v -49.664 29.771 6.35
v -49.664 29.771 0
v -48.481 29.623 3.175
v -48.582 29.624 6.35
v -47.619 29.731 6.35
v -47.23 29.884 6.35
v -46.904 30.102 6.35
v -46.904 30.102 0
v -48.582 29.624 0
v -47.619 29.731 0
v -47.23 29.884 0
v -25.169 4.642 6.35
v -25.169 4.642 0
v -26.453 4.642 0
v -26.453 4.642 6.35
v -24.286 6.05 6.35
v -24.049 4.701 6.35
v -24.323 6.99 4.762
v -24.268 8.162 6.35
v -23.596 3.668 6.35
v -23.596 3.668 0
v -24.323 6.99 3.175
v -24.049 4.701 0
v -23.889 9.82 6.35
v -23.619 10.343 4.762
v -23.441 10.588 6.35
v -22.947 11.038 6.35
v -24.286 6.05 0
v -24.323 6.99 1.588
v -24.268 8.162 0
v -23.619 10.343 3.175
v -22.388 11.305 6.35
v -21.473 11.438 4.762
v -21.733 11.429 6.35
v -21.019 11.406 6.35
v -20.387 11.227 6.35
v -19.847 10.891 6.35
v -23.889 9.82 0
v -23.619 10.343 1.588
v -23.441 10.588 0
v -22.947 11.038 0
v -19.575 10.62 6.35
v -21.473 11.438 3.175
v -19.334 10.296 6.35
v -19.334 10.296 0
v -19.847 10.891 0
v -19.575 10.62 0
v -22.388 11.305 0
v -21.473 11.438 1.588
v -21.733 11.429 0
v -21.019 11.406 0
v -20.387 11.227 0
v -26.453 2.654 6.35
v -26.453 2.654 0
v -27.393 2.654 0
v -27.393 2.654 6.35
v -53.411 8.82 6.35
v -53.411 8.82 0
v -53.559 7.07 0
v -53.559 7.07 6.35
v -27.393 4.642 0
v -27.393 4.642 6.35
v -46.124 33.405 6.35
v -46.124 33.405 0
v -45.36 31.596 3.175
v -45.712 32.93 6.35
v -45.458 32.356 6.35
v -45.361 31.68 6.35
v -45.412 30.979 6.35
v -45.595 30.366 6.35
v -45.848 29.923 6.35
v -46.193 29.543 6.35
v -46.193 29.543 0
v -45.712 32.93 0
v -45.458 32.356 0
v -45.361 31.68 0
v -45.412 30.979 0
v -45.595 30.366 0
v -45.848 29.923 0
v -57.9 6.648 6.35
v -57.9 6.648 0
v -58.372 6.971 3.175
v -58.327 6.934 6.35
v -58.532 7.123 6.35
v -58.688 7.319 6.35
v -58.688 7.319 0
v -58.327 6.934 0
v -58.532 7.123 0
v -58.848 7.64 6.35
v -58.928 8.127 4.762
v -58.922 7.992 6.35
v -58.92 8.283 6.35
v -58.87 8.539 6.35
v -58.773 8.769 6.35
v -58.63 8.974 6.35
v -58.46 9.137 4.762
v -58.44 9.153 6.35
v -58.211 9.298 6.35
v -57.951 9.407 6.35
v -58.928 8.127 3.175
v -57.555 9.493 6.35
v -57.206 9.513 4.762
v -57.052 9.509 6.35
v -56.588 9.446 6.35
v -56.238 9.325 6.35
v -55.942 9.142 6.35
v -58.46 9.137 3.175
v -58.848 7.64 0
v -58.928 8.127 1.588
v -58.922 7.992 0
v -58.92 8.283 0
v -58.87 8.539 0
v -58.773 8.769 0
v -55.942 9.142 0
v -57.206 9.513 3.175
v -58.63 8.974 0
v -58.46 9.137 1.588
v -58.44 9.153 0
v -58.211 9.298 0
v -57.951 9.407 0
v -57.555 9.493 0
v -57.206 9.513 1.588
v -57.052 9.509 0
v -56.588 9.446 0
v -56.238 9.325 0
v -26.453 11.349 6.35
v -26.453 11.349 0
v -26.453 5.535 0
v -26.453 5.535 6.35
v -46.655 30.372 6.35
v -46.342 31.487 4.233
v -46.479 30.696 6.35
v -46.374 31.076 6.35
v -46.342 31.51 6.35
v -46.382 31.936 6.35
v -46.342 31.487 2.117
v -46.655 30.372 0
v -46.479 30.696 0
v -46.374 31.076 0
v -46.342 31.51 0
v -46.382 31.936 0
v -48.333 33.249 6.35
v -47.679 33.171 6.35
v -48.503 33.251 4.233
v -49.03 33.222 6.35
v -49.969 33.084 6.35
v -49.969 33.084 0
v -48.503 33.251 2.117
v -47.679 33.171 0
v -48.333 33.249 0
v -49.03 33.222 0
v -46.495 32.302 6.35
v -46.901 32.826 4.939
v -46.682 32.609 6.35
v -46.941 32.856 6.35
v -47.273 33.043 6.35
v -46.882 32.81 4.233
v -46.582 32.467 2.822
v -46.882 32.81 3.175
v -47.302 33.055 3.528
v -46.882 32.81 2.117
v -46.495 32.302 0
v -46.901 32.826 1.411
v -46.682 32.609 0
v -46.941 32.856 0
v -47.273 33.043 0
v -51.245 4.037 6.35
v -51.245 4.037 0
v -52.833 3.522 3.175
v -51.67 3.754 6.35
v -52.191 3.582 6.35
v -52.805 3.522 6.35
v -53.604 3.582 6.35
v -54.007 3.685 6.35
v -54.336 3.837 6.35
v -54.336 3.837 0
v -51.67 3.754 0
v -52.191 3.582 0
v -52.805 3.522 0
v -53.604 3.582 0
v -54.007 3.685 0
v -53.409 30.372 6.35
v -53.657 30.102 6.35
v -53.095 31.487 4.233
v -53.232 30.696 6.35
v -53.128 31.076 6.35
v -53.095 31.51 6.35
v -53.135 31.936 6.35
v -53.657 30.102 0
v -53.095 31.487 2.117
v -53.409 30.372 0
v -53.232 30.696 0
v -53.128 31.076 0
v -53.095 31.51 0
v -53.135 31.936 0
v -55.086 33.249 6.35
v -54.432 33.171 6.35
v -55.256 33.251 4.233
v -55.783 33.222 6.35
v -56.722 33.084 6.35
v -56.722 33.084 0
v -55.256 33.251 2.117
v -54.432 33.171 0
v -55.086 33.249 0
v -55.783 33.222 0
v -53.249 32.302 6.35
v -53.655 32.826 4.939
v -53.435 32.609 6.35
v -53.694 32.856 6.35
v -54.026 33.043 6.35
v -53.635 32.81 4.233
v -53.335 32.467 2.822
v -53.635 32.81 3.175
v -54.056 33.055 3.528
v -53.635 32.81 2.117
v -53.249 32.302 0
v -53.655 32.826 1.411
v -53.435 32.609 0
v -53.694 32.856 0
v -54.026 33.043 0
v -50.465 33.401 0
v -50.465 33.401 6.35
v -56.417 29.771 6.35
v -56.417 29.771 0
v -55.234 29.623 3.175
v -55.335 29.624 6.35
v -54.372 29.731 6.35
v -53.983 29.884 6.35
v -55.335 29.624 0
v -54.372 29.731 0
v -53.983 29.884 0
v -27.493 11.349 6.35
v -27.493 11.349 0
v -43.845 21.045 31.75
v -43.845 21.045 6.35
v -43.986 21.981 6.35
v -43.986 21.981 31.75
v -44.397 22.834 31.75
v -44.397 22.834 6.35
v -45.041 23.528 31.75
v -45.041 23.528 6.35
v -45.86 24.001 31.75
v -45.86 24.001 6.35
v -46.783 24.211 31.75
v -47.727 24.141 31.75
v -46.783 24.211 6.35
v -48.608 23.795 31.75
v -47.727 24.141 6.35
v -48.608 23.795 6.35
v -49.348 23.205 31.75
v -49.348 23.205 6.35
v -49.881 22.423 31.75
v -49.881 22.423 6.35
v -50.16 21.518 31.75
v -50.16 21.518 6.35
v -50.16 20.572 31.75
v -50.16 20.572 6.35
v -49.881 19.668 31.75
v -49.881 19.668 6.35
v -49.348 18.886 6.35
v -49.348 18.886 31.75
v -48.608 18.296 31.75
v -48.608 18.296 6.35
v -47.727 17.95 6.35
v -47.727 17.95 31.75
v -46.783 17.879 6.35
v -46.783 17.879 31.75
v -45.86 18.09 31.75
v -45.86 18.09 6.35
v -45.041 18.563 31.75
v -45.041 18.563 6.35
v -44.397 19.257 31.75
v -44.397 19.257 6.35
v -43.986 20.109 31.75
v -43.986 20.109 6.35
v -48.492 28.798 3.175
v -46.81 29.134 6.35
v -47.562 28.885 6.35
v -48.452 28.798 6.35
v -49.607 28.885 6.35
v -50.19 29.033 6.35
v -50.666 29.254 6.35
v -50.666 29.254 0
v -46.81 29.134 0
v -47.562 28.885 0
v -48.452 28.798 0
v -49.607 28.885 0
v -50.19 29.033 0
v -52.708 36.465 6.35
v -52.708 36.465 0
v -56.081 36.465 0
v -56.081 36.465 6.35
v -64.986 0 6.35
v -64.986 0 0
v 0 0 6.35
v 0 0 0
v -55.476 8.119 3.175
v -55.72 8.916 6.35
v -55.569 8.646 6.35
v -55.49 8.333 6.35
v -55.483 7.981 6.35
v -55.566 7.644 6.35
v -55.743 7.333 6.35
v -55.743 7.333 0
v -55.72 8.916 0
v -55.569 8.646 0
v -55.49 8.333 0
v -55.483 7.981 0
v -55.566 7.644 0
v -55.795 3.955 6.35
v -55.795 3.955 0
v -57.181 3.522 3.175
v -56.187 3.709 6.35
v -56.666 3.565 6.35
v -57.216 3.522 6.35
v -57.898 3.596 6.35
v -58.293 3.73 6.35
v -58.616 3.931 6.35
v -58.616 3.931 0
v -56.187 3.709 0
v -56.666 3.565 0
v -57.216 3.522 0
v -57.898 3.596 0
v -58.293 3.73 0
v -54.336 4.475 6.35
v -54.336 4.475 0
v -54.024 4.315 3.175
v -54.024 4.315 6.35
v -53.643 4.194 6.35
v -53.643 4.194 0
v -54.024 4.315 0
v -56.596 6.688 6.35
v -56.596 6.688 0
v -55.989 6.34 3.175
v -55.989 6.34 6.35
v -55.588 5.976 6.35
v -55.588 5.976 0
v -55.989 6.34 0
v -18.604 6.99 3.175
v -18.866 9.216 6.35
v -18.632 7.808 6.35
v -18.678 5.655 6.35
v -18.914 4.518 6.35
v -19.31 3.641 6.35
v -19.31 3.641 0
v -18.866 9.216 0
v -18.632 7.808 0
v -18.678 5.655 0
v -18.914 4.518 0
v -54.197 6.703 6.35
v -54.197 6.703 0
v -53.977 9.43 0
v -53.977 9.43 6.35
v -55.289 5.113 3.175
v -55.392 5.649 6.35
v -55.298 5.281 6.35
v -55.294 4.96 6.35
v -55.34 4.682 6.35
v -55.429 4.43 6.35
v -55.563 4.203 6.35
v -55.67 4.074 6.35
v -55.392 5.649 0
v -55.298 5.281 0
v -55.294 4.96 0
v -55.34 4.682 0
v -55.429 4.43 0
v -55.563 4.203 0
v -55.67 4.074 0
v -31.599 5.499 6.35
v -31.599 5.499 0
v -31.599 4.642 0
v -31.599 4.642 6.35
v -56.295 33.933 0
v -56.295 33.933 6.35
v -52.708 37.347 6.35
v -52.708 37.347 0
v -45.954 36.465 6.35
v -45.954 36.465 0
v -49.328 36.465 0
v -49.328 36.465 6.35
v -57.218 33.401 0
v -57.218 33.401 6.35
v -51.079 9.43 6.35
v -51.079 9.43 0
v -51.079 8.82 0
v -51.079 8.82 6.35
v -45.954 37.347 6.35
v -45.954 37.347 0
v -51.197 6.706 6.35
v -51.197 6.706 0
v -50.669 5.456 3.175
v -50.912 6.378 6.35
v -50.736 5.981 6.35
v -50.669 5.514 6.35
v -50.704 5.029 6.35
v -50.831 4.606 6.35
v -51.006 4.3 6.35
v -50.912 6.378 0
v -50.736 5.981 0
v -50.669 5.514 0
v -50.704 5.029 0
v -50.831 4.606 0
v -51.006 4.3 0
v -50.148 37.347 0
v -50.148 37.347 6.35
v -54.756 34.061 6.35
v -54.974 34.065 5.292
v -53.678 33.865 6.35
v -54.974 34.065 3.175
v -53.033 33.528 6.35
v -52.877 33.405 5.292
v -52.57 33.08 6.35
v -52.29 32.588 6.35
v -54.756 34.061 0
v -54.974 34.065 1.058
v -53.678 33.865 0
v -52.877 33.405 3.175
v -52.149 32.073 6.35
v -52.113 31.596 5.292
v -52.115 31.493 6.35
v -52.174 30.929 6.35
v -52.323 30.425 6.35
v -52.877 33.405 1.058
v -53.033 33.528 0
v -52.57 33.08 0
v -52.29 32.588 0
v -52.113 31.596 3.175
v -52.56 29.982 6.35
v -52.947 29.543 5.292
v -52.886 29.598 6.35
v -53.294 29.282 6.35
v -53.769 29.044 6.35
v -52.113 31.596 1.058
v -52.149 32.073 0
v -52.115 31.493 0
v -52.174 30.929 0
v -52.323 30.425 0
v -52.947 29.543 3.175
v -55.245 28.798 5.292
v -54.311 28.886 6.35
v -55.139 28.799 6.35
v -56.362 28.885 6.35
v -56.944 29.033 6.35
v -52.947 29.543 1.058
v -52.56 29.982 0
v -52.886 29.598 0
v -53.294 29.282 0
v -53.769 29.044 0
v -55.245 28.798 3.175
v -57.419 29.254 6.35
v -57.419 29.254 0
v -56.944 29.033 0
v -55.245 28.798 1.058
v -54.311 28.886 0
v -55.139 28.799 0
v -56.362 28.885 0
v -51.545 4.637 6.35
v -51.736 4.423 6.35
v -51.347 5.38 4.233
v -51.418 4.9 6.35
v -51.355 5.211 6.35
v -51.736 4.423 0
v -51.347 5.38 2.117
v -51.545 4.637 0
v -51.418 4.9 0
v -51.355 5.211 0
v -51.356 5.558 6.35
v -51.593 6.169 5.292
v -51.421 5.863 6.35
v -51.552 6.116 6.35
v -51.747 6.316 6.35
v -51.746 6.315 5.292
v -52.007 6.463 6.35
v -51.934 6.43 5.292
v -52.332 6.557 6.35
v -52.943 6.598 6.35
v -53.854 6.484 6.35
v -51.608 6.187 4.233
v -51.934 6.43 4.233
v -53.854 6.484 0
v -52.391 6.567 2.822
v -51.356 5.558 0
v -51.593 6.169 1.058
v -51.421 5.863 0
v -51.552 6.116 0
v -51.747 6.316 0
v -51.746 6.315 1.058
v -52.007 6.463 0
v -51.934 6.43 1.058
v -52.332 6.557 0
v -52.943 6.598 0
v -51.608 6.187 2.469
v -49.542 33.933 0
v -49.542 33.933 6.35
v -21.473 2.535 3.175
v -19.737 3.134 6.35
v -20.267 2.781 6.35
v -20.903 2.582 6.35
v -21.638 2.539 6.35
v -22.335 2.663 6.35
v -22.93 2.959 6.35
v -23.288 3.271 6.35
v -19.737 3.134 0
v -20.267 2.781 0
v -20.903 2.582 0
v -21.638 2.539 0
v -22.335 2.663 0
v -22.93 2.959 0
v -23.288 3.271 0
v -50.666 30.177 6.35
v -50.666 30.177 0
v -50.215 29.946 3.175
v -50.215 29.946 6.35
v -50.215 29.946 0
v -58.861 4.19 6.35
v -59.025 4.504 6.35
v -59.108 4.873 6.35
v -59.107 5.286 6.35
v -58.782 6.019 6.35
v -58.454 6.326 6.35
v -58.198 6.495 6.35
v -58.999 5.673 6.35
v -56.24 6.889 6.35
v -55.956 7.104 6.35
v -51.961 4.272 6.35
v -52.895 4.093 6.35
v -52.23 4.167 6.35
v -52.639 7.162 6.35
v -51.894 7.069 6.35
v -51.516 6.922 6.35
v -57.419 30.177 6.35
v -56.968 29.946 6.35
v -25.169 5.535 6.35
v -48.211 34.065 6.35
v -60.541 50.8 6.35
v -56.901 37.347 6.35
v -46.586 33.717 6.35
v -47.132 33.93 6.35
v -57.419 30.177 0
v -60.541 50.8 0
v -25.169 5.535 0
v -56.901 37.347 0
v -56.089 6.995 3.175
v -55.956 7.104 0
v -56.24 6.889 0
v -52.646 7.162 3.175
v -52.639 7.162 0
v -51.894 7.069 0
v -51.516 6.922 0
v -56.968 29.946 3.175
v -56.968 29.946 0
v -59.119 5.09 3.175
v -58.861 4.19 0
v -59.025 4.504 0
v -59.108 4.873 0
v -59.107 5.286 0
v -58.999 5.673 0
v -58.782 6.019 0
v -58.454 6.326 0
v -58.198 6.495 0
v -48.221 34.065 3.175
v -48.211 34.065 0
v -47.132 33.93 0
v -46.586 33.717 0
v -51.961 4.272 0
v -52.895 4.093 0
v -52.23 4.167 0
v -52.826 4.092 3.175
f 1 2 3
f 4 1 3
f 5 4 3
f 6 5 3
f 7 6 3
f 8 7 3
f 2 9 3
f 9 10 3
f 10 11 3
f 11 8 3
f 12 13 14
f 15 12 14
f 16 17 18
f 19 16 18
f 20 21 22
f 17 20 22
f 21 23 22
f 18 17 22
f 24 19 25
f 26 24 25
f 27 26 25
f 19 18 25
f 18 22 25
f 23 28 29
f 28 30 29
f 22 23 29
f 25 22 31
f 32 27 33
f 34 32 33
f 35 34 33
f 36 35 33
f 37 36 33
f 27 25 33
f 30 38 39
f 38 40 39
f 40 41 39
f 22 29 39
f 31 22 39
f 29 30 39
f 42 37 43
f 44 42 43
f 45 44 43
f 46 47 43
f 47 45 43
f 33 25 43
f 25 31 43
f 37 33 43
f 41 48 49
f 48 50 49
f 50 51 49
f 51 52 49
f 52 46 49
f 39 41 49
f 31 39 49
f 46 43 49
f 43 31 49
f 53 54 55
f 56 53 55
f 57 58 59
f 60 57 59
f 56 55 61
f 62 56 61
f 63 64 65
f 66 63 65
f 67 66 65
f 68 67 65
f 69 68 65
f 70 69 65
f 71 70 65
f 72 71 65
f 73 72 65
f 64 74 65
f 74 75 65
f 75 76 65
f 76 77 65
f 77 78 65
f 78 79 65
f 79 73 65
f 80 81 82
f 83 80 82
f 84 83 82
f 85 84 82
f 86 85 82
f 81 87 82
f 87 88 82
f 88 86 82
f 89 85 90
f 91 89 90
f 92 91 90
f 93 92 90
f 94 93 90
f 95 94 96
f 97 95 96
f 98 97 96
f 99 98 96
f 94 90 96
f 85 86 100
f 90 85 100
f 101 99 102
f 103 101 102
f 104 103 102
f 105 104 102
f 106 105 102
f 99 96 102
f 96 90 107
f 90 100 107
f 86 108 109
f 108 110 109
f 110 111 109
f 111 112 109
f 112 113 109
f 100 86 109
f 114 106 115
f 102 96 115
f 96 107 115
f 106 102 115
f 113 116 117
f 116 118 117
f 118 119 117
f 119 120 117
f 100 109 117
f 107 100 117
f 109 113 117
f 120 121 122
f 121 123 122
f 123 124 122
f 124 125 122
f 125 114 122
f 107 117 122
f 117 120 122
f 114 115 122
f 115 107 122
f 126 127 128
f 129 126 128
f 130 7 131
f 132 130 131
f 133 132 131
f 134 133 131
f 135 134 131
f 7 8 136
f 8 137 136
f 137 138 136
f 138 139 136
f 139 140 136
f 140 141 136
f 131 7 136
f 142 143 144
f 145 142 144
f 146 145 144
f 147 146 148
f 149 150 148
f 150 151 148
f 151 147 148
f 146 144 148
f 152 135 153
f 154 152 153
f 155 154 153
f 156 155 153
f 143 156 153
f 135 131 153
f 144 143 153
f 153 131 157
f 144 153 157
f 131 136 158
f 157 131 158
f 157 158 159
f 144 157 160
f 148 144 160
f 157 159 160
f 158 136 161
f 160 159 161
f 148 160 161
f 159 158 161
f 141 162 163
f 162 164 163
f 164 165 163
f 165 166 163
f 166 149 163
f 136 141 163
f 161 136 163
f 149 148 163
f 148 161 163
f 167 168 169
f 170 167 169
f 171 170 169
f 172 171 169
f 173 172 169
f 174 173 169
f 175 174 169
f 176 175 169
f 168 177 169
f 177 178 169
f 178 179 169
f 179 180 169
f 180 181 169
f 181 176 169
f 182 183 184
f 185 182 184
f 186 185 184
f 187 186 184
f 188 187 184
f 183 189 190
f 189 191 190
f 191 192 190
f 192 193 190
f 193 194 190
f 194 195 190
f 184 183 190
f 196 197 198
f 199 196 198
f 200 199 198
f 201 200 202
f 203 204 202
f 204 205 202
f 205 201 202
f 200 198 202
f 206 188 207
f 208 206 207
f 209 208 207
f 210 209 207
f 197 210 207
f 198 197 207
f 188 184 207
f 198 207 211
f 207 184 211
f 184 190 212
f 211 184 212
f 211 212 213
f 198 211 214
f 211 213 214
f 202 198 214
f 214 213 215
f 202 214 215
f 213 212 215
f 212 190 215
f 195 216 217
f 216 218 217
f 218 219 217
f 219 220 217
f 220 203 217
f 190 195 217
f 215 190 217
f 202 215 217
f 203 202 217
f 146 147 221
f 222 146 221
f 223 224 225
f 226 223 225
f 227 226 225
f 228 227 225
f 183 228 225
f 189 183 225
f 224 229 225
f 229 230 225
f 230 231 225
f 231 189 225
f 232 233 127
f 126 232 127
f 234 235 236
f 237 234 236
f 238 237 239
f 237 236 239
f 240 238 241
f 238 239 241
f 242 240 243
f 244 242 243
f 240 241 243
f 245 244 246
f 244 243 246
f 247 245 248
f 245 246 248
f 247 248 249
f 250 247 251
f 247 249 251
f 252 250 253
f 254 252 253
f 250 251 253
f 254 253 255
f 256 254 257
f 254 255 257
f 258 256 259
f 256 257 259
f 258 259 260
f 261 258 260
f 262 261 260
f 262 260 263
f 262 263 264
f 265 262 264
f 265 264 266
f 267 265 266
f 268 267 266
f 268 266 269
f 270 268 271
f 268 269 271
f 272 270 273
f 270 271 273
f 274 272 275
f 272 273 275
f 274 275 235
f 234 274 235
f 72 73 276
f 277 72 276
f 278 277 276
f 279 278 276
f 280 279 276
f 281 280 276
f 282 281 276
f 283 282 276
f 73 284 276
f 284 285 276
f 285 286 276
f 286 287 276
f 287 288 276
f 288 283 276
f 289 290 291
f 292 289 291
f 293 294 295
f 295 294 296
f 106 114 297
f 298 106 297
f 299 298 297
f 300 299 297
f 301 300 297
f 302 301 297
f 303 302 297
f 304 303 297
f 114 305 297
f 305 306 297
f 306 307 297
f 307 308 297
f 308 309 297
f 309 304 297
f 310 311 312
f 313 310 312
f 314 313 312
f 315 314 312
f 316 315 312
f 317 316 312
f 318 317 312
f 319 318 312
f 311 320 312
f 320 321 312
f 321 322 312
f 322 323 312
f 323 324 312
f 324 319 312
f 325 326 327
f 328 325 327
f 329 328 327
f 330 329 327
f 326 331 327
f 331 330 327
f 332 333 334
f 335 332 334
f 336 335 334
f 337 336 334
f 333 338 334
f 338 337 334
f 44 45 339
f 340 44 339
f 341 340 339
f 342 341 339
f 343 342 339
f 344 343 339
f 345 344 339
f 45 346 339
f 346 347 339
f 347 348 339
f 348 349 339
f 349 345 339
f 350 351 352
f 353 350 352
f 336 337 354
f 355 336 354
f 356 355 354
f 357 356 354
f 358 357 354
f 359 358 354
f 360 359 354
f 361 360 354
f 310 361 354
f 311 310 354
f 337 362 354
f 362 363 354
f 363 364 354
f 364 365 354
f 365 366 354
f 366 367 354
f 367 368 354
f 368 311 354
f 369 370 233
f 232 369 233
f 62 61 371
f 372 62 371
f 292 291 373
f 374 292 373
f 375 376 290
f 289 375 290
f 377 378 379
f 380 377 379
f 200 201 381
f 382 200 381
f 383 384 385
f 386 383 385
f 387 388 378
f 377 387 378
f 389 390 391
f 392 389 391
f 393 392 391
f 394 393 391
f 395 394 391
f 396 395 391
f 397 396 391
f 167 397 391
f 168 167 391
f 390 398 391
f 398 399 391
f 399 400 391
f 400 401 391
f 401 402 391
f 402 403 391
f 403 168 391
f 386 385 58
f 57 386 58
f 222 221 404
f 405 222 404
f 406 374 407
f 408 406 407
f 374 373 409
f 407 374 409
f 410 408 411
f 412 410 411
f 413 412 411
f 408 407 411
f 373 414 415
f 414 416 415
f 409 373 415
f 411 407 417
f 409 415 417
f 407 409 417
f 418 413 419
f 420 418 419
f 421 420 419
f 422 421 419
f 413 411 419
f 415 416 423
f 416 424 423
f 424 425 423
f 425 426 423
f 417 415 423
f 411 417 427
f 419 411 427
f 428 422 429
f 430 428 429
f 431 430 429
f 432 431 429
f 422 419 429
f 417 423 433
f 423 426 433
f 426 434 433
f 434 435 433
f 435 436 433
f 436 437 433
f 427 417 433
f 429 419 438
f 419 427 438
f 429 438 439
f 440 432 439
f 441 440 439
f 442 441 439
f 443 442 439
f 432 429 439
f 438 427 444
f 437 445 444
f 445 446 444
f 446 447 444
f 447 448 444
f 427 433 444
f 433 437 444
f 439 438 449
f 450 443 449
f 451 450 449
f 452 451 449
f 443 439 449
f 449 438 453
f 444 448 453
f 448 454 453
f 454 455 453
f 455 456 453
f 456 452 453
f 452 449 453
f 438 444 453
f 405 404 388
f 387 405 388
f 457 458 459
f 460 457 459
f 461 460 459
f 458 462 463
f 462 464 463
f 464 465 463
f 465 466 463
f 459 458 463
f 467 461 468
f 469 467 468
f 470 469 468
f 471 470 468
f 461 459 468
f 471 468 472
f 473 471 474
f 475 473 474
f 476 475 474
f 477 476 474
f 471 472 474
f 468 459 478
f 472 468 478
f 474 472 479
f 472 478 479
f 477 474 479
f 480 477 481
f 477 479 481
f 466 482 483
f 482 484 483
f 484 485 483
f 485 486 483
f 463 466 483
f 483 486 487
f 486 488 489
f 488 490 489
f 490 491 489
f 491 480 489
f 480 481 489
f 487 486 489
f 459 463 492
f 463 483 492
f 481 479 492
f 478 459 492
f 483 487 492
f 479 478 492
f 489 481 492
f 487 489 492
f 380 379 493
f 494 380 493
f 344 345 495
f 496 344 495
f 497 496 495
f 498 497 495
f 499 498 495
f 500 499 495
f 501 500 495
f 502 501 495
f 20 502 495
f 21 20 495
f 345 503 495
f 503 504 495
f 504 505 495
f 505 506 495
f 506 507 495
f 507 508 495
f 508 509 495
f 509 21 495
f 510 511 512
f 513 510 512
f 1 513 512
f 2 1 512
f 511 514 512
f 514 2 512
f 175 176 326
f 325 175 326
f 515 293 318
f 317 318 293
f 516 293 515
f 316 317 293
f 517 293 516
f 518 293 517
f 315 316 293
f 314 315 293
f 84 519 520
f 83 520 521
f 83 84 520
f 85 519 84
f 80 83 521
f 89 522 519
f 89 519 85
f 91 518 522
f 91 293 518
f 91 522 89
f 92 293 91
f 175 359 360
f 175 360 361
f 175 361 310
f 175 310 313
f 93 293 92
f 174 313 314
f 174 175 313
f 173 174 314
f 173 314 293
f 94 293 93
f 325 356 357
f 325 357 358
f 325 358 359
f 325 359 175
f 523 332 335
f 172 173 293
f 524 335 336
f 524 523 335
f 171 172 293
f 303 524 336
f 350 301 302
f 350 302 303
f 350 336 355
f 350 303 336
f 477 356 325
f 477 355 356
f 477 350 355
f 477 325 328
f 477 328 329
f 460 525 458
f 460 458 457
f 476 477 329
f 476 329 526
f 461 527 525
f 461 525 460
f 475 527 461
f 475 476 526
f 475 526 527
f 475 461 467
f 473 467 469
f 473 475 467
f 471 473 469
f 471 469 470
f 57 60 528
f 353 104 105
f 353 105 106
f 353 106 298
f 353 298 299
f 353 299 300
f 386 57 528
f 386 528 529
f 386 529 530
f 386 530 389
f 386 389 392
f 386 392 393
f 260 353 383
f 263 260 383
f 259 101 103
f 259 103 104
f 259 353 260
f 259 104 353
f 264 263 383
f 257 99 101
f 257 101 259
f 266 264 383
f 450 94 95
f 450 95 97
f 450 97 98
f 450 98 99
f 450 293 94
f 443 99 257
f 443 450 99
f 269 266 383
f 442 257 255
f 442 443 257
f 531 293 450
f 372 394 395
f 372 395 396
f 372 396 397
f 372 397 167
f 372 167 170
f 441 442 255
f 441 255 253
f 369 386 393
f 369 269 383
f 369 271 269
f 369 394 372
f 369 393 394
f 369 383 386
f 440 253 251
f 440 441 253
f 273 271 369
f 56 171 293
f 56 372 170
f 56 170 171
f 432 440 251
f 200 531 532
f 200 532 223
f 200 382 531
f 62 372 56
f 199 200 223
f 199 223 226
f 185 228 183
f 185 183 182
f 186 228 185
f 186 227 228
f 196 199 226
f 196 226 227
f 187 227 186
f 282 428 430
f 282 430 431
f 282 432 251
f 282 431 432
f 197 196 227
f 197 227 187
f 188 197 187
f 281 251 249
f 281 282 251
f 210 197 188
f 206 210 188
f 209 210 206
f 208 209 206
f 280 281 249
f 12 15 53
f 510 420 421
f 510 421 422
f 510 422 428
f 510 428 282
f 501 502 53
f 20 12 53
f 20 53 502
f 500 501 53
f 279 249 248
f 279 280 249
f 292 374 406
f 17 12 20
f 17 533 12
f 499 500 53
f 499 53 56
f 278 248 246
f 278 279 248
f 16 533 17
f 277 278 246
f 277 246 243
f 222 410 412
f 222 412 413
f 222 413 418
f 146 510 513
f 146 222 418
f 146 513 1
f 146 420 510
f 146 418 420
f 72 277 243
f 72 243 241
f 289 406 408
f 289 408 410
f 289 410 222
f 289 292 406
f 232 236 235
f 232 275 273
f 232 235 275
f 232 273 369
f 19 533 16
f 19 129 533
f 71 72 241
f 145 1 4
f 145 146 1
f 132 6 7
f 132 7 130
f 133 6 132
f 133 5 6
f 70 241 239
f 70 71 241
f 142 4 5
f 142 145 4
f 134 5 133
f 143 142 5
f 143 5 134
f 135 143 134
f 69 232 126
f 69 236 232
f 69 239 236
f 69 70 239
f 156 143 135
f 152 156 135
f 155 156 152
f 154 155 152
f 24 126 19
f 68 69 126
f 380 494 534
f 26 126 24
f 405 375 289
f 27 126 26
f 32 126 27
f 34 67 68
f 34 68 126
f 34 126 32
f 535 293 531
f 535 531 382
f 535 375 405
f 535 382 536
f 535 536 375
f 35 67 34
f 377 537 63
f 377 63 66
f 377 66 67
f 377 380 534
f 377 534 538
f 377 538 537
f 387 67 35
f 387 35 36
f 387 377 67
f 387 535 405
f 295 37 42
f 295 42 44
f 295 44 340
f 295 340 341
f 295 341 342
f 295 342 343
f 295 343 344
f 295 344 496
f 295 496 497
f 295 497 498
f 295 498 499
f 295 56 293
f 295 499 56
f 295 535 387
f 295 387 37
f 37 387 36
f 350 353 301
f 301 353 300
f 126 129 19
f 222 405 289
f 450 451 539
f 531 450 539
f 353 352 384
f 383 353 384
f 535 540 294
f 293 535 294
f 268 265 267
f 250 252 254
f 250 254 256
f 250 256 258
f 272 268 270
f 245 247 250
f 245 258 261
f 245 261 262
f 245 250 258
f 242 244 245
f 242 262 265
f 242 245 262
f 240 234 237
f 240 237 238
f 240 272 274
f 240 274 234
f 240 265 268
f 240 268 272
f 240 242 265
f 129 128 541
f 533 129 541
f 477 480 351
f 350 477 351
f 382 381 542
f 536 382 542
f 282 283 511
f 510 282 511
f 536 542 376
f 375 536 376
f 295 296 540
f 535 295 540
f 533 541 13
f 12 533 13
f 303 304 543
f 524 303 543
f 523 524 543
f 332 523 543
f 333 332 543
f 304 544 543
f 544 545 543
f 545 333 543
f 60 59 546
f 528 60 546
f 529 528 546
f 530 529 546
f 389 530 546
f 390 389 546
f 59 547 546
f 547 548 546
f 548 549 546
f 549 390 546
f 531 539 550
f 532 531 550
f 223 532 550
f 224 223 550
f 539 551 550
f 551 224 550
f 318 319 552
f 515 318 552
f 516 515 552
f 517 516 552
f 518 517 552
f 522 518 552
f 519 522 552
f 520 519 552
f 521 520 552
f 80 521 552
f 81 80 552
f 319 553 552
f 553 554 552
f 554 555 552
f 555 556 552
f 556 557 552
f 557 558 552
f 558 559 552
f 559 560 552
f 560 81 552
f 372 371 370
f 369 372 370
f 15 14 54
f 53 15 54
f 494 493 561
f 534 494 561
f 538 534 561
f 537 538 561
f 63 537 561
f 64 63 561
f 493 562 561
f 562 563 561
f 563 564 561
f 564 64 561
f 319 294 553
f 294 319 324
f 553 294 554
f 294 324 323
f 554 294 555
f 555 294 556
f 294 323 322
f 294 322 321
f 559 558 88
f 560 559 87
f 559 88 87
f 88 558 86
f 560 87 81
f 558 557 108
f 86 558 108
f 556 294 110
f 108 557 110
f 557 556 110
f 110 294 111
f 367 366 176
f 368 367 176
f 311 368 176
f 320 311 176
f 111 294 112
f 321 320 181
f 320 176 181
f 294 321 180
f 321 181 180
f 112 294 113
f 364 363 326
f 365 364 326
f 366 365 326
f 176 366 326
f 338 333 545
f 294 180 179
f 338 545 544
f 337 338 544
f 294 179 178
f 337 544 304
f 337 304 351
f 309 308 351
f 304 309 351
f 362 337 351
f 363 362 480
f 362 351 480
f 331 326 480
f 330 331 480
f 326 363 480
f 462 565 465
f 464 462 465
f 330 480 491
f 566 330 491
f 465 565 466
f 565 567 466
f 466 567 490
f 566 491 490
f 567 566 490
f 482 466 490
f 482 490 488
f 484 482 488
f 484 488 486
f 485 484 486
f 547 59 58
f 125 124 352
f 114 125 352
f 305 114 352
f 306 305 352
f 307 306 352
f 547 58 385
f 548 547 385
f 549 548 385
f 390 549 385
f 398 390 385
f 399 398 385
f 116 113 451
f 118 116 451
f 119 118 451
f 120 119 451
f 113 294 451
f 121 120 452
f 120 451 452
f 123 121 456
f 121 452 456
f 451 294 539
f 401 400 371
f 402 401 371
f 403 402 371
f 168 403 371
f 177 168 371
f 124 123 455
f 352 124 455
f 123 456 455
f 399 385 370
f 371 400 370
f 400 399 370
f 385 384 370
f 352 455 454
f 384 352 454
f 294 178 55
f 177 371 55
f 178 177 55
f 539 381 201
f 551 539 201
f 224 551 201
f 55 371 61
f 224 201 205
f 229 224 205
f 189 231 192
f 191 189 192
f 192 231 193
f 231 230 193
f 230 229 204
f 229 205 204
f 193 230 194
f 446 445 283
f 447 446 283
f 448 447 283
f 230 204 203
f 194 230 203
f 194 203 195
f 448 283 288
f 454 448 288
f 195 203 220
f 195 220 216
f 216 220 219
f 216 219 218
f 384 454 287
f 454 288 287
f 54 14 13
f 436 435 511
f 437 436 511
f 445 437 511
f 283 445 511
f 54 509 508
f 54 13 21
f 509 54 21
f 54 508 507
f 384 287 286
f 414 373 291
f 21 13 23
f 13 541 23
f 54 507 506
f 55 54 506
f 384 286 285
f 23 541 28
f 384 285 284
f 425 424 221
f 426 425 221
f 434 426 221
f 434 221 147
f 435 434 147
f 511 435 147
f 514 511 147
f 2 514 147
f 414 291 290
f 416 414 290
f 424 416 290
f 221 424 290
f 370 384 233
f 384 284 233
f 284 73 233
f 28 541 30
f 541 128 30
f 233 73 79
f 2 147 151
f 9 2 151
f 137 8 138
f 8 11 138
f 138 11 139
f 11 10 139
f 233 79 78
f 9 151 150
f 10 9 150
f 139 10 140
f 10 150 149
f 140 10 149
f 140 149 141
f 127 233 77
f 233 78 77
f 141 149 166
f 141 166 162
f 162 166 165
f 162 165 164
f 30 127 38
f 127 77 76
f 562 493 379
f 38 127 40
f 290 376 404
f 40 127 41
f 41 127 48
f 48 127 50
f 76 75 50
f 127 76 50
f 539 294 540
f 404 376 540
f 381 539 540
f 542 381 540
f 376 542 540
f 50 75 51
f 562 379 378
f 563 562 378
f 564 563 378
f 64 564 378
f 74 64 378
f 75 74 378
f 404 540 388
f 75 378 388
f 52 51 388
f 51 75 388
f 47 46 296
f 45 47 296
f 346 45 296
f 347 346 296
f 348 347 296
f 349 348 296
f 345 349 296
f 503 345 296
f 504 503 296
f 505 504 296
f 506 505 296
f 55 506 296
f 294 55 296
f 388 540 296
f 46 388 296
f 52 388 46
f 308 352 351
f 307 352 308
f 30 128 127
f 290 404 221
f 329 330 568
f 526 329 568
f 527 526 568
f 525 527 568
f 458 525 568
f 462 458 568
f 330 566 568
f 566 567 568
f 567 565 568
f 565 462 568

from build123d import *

# Parameters (mm, degrees)
F1_DEPTH = 6.35
F2_R     = 3.175
F3_DEPTH = 25.4


with BuildPart() as f1:
    # F0 (on Top) → F1 (new body)
    with BuildSketch(Plane.XY):
        Polygon((0, 0), (-60.5410825038, 50.8), (-64.9855066109, 0), align=None)
        with BuildLine():
            add(Edge.make_bspline(
                [(-58.459534205, 9.1367480254), (-57.9914250831, 9.5130210253), (-57.2057160392, 9.5130210253)],
                knots=[0, 0, 0, 1, 1, 1], degree=2))
            add(Edge.make_bspline(
                [(-57.2057160392, 9.5130210253), (-56.4085274801, 9.5130210253), (-55.9423316107, 9.142487783)],
                knots=[0, 0, 0, 1, 1, 1], degree=2))
            add(Edge.make_bspline(
                [(-55.9423316107, 9.142487783), (-55.4761357414, 8.7719545407), (-55.4761357414, 8.1188976731)],
                knots=[0, 0, 0, 1, 1, 1], degree=2))
            add(Edge.make_bspline(
                [(-55.4761357414, 8.1188976731), (-55.4761357414, 7.6877781003), (-55.7427155955, 7.3331886292)],
                knots=[0, 0, 0, 1, 1, 1], degree=2))
            add(Edge.make_bspline(
                [(-55.7427155955, 7.3331886292), (-56.0092954497, 6.9785991581), (-56.5960262292, 6.6877847718)],
                knots=[0, 0, 0, 1, 1, 1], degree=2))
            add(Edge.make_bspline(
                [(-56.5960262292, 6.6877847718), (-55.886847287, 6.348501321), (-55.5877421397, 5.9760548262)],
                knots=[0, 0, 0, 1, 1, 1], degree=2))
            add(Edge.make_bspline(
                [(-55.5877421397, 5.9760548262), (-55.2886369923, 5.6036083314), (-55.2886369923, 5.1125401789)],
                knots=[0, 0, 0, 1, 1, 1], degree=2))
            add(Edge.make_bspline(
                [(-55.2886369923, 5.1125401789), (-55.2886369923, 4.3880552164), (-55.795011165, 3.9550223911)],
                knots=[0, 0, 0, 1, 1, 1], degree=2))
            add(Edge.make_bspline(
                [(-55.795011165, 3.9550223911), (-56.3013853378, 3.5219895658), (-57.181481507, 3.5219895658)],
                knots=[0, 0, 0, 1, 1, 1], degree=2))
            add(Edge.make_bspline(
                [(-57.181481507, 3.5219895658), (-58.1138732458, 3.5219895658), (-58.6164209134, 3.9307878589)],
                knots=[0, 0, 0, 1, 1, 1], degree=2))
            add(Edge.make_bspline(
                [(-58.6164209134, 3.9307878589), (-59.1189685811, 4.339586152), (-59.1189685811, 5.0895811484)],
                knots=[0, 0, 0, 1, 1, 1], degree=2))
            add(Edge.make_bspline(
                [(-59.1189685811, 5.0895811484), (-59.1189685811, 6.089574477), (-57.8995889611, 6.6482442192)],
                knots=[0, 0, 0, 1, 1, 1], degree=2))
            add(Edge.make_bspline(
                [(-57.8995889611, 6.6482442192), (-58.4493301915, 6.958191131), (-58.6884867592, 7.3191581106)],
                knots=[0, 0, 0, 1, 1, 1], degree=2))
            add(Edge.make_bspline(
                [(-58.6884867592, 7.3191581106), (-58.9276433269, 7.6801250901), (-58.9276433269, 8.1265506833)],
                knots=[0, 0, 0, 1, 1, 1], degree=2))
            add(Edge.make_bspline(
                [(-58.9276433269, 8.1265506833), (-58.9276433269, 8.7604750255), (-58.459534205, 9.1367480254)],
                knots=[0, 0, 0, 1, 1, 1], degree=2))
        make_face(mode=Mode.SUBTRACT)
        with BuildLine():
            add(Edge.make_bspline(
                [(-53.5590566944, 7.0704352801), (-53.1011515861, 7.1622714021), (-52.6457974811, 7.1622714021)],
                knots=[0, 0, 0, 1, 1, 1], degree=2))
            add(Edge.make_bspline(
                [(-52.6457974811, 7.1622714021), (-51.7248852576, 7.1622714021), (-51.196827556, 6.7056417955)],
                knots=[0, 0, 0, 1, 1, 1], degree=2))
            add(Edge.make_bspline(
                [(-51.196827556, 6.7056417955), (-50.6687698545, 6.2490121888), (-50.6687698545, 5.4556501348)],
                knots=[0, 0, 0, 1, 1, 1], degree=2))
            add(Edge.make_bspline(
                [(-50.6687698545, 5.4556501348), (-50.6687698545, 4.5513194333), (-51.2446588696, 4.0366544996)],
                knots=[0, 0, 0, 1, 1, 1], degree=2))
            add(Edge.make_bspline(
                [(-51.2446588696, 4.0366544996), (-51.8205478847, 3.5219895658), (-52.8332962302, 3.5219895658)],
                knots=[0, 0, 0, 1, 1, 1], degree=2))
            add(Edge.make_bspline(
                [(-52.8332962302, 3.5219895658), (-53.8179835384, 3.5219895658), (-54.3358372264, 3.8370384844)],
                knots=[0, 0, 0, 1, 1, 1], degree=2))
            Line((-54.3358372264, 3.8370384844), (-54.3358372264, 4.4747893317))
            add(Edge.make_bspline(
                [(-54.3358372264, 4.4747893317), (-54.057777857, 4.2962190944), (-53.6432398063, 4.1941789588)],
                knots=[0, 0, 0, 1, 1, 1], degree=2))
            add(Edge.make_bspline(
                [(-53.6432398063, 4.1941789588), (-53.2287017555, 4.0921388233), (-52.82564322, 4.0921388233)],
                knots=[0, 0, 0, 1, 1, 1], degree=2))
            add(Edge.make_bspline(
                [(-52.82564322, 4.0921388233), (-52.124117288, 4.0921388233), (-51.735727022, 4.423131513)],
                knots=[0, 0, 0, 1, 1, 1], degree=2))
            add(Edge.make_bspline(
                [(-51.735727022, 4.423131513), (-51.347336756, 4.7541242028), (-51.347336756, 5.3803955348)],
                knots=[0, 0, 0, 1, 1, 1], degree=2))
            add(Edge.make_bspline(
                [(-51.347336756, 5.3803955348), (-51.347336756, 6.5997751548), (-52.8409492404, 6.5997751548)],
                knots=[0, 0, 0, 1, 1, 1], degree=2))
            add(Edge.make_bspline(
                [(-52.8409492404, 6.5997751548), (-53.2197732437, 6.5997751548), (-53.8536975859, 6.4837045006)],
                knots=[0, 0, 0, 1, 1, 1], degree=2))
            Line((-53.8536975859, 6.4837045006), (-54.1968075417, 6.7030907921))
            Line((-54.1968075417, 6.7030907921), (-53.9774212502, 9.4301134151))
            Line((-53.9774212502, 9.4301134151), (-51.0794814001, 9.4301134151))
            Line((-51.0794814001, 9.4301134151), (-51.0794814001, 8.8204236051))
            Line((-51.0794814001, 8.8204236051), (-53.4110984978, 8.8204236051))
            Line((-53.4110984978, 8.8204236051), (-53.5590566944, 7.0704352801))
        make_face(mode=Mode.SUBTRACT)
        Polygon((-25.1692710203, 5.5350187531), (-25.1692710203, 4.6416738651), (-26.4525079569, 4.6416738651), (-26.4525079569, 2.6543600252), (-27.3931698412, 2.6543600252), (-27.3931698412, 4.6416738651), (-31.5987044623, 4.6416738651), (-31.5987044623, 5.499057836), (-27.4934818731, 11.3493312447), (-26.4525079569, 11.3493312447), (-26.4525079569, 5.5350187531), align=None, mode=Mode.SUBTRACT)
        with BuildLine():
            add(Edge.make_bspline(
                [(-19.3341390504, 10.2960549095), (-18.6035646293, 9.1538226216), (-18.6035646293, 6.9904895558)],
                knots=[0, 0, 0, 1, 1, 1], degree=2))
            add(Edge.make_bspline(
                [(-18.6035646293, 6.9904895558), (-18.6035646293, 4.7476639365), (-19.3104805523, 3.6413925657)],
                knots=[0, 0, 0, 1, 1, 1], degree=2))
            add(Edge.make_bspline(
                [(-19.3104805523, 3.6413925657), (-20.0173964754, 2.5351211948), (-21.4728672781, 2.5351211948)],
                knots=[0, 0, 0, 1, 1, 1], degree=2))
            add(Edge.make_bspline(
                [(-21.4728672781, 2.5351211948), (-22.8677723258, 2.5351211948), (-23.5955077271, 3.6678900835)],
                knots=[0, 0, 0, 1, 1, 1], degree=2))
            add(Edge.make_bspline(
                [(-23.5955077271, 3.6678900835), (-24.3232431285, 4.8006589723), (-24.3232431285, 6.9904895558)],
                knots=[0, 0, 0, 1, 1, 1], degree=2))
            add(Edge.make_bspline(
                [(-24.3232431285, 6.9904895558), (-24.3232431285, 9.2484566139), (-23.6191662252, 10.3433719057)],
                knots=[0, 0, 0, 1, 1, 1], degree=2))
            add(Edge.make_bspline(
                [(-23.6191662252, 10.3433719057), (-22.9150893219, 11.4382871975), (-21.4728672781, 11.4382871975)],
                knots=[0, 0, 0, 1, 1, 1], degree=2))
            add(Edge.make_bspline(
                [(-21.4728672781, 11.4382871975), (-20.0647134716, 11.4382871975), (-19.3341390504, 10.2960549095)],
                knots=[0, 0, 0, 1, 1, 1], degree=2))
        make_face(mode=Mode.SUBTRACT)
        with BuildLine():
            add(Edge.make_bspline(
                [(-56.295432625, 33.9325300153), (-55.632851454, 34.0654153755), (-54.973961543, 34.0654153755)],
                knots=[0, 0, 0, 1, 1, 1], degree=2))
            add(Edge.make_bspline(
                [(-54.973961543, 34.0654153755), (-53.641416681, 34.0654153755), (-52.8773258599, 33.4046798345)],
                knots=[0, 0, 0, 1, 1, 1], degree=2))
            add(Edge.make_bspline(
                [(-52.8773258599, 33.4046798345), (-52.1132350388, 32.7439442935), (-52.1132350388, 31.5959624318)],
                knots=[0, 0, 0, 1, 1, 1], degree=2))
            add(Edge.make_bspline(
                [(-52.1132350388, 31.5959624318), (-52.1132350388, 30.2874107598), (-52.946536985, 29.5426990537)],
                knots=[0, 0, 0, 1, 1, 1], degree=2))
            add(Edge.make_bspline(
                [(-52.946536985, 29.5426990537), (-53.7798389312, 28.7979873476), (-55.2452691534, 28.7979873476)],
                knots=[0, 0, 0, 1, 1, 1], degree=2))
            add(Edge.make_bspline(
                [(-55.2452691534, 28.7979873476), (-56.6700955155, 28.7979873476), (-57.4194212967, 29.2538579583)],
                knots=[0, 0, 0, 1, 1, 1], degree=2))
            Line((-57.4194212967, 29.2538579583), (-57.4194212967, 30.1766729597))
            add(Edge.make_bspline(
                [(-57.4194212967, 30.1766729597), (-57.0170739561, 29.9182847593), (-56.4172442052, 29.7706343591)],
                knots=[0, 0, 0, 1, 1, 1], degree=2))
            add(Edge.make_bspline(
                [(-56.4172442052, 29.7706343591), (-55.8174144543, 29.6229839588), (-55.2341953734, 29.6229839588)],
                knots=[0, 0, 0, 1, 1, 1], degree=2))
            add(Edge.make_bspline(
                [(-55.2341953734, 29.6229839588), (-54.2190988719, 29.6229839588), (-53.6571045361, 30.1019249446)],
                knots=[0, 0, 0, 1, 1, 1], degree=2))
            add(Edge.make_bspline(
                [(-53.6571045361, 30.1019249446), (-53.0951102002, 30.5808659303), (-53.0951102002, 31.4870702616)],
                knots=[0, 0, 0, 1, 1, 1], degree=2))
            add(Edge.make_bspline(
                [(-53.0951102002, 31.4870702616), (-53.0951102002, 33.2514925442), (-55.2563429334, 33.2514925442)],
                knots=[0, 0, 0, 1, 1, 1], degree=2))
            add(Edge.make_bspline(
                [(-55.2563429334, 33.2514925442), (-55.8044950443, 33.2514925442), (-56.7217731556, 33.083540214)],
                knots=[0, 0, 0, 1, 1, 1], degree=2))
            Line((-56.7217731556, 33.083540214), (-57.2182476264, 33.4009885745))
            Line((-57.2182476264, 33.4009885745), (-56.9007992659, 37.3469455203))
            Line((-56.9007992659, 37.3469455203), (-52.7075278996, 37.3469455203))
            Line((-52.7075278996, 37.3469455203), (-52.7075278996, 36.464734379))
            Line((-52.7075278996, 36.464734379), (-56.0813395447, 36.464734379))
            Line((-56.0813395447, 36.464734379), (-56.295432625, 33.9325300153))
        make_face(mode=Mode.SUBTRACT)
        with BuildLine():
            add(Edge.make_bspline(
                [(-49.5422724449, 33.9325300153), (-48.8796912739, 34.0654153755), (-48.220801363, 34.0654153755)],
                knots=[0, 0, 0, 1, 1, 1], degree=2))
            add(Edge.make_bspline(
                [(-48.220801363, 34.0654153755), (-46.888256501, 34.0654153755), (-46.1241656798, 33.4046798345)],
                knots=[0, 0, 0, 1, 1, 1], degree=2))
            add(Edge.make_bspline(
                [(-46.1241656798, 33.4046798345), (-45.3600748587, 32.7439442935), (-45.3600748587, 31.5959624318)],
                knots=[0, 0, 0, 1, 1, 1], degree=2))
            add(Edge.make_bspline(
                [(-45.3600748587, 31.5959624318), (-45.3600748587, 30.2874107598), (-46.1933768049, 29.5426990537)],
                knots=[0, 0, 0, 1, 1, 1], degree=2))
            add(Edge.make_bspline(
                [(-46.1933768049, 29.5426990537), (-47.0266787512, 28.7979873476), (-48.4921089734, 28.7979873476)],
                knots=[0, 0, 0, 1, 1, 1], degree=2))
            add(Edge.make_bspline(
                [(-48.4921089734, 28.7979873476), (-49.9169353355, 28.7979873476), (-50.6662611166, 29.2538579583)],
                knots=[0, 0, 0, 1, 1, 1], degree=2))
            Line((-50.6662611166, 29.2538579583), (-50.6662611166, 30.1766729597))
            add(Edge.make_bspline(
                [(-50.6662611166, 30.1766729597), (-50.263913776, 29.9182847593), (-49.6640840251, 29.7706343591)],
                knots=[0, 0, 0, 1, 1, 1], degree=2))
            add(Edge.make_bspline(
                [(-49.6640840251, 29.7706343591), (-49.0642542742, 29.6229839588), (-48.4810351934, 29.6229839588)],
                knots=[0, 0, 0, 1, 1, 1], degree=2))
            add(Edge.make_bspline(
                [(-48.4810351934, 29.6229839588), (-47.4659386918, 29.6229839588), (-46.903944356, 30.1019249446)],
                knots=[0, 0, 0, 1, 1, 1], degree=2))
            add(Edge.make_bspline(
                [(-46.903944356, 30.1019249446), (-46.3419500202, 30.5808659303), (-46.3419500202, 31.4870702616)],
                knots=[0, 0, 0, 1, 1, 1], degree=2))
            add(Edge.make_bspline(
                [(-46.3419500202, 31.4870702616), (-46.3419500202, 33.2514925442), (-48.5031827534, 33.2514925442)],
                knots=[0, 0, 0, 1, 1, 1], degree=2))
            add(Edge.make_bspline(
                [(-48.5031827534, 33.2514925442), (-49.0513348642, 33.2514925442), (-49.9686129756, 33.083540214)],
                knots=[0, 0, 0, 1, 1, 1], degree=2))
            Line((-49.9686129756, 33.083540214), (-50.4650874463, 33.4009885745))
            Line((-50.4650874463, 33.4009885745), (-50.1476390858, 37.3469455203))
            Line((-50.1476390858, 37.3469455203), (-45.9543677196, 37.3469455203))
            Line((-45.9543677196, 37.3469455203), (-45.9543677196, 36.464734379))
            Line((-45.9543677196, 36.464734379), (-49.3281793646, 36.464734379))
            Line((-49.3281793646, 36.464734379), (-49.5422724449, 33.9325300153))
        make_face(mode=Mode.SUBTRACT)
    extrude(amount=F1_DEPTH)

    # F2 (on face) → F3 (join)
    with BuildSketch(Plane.XY.offset(6.35)):
        with Locations((-47.0200963318, 21.0452843457)):
            Circle(F2_R)
    extrude(amount=F3_DEPTH)


solid = f1.part
